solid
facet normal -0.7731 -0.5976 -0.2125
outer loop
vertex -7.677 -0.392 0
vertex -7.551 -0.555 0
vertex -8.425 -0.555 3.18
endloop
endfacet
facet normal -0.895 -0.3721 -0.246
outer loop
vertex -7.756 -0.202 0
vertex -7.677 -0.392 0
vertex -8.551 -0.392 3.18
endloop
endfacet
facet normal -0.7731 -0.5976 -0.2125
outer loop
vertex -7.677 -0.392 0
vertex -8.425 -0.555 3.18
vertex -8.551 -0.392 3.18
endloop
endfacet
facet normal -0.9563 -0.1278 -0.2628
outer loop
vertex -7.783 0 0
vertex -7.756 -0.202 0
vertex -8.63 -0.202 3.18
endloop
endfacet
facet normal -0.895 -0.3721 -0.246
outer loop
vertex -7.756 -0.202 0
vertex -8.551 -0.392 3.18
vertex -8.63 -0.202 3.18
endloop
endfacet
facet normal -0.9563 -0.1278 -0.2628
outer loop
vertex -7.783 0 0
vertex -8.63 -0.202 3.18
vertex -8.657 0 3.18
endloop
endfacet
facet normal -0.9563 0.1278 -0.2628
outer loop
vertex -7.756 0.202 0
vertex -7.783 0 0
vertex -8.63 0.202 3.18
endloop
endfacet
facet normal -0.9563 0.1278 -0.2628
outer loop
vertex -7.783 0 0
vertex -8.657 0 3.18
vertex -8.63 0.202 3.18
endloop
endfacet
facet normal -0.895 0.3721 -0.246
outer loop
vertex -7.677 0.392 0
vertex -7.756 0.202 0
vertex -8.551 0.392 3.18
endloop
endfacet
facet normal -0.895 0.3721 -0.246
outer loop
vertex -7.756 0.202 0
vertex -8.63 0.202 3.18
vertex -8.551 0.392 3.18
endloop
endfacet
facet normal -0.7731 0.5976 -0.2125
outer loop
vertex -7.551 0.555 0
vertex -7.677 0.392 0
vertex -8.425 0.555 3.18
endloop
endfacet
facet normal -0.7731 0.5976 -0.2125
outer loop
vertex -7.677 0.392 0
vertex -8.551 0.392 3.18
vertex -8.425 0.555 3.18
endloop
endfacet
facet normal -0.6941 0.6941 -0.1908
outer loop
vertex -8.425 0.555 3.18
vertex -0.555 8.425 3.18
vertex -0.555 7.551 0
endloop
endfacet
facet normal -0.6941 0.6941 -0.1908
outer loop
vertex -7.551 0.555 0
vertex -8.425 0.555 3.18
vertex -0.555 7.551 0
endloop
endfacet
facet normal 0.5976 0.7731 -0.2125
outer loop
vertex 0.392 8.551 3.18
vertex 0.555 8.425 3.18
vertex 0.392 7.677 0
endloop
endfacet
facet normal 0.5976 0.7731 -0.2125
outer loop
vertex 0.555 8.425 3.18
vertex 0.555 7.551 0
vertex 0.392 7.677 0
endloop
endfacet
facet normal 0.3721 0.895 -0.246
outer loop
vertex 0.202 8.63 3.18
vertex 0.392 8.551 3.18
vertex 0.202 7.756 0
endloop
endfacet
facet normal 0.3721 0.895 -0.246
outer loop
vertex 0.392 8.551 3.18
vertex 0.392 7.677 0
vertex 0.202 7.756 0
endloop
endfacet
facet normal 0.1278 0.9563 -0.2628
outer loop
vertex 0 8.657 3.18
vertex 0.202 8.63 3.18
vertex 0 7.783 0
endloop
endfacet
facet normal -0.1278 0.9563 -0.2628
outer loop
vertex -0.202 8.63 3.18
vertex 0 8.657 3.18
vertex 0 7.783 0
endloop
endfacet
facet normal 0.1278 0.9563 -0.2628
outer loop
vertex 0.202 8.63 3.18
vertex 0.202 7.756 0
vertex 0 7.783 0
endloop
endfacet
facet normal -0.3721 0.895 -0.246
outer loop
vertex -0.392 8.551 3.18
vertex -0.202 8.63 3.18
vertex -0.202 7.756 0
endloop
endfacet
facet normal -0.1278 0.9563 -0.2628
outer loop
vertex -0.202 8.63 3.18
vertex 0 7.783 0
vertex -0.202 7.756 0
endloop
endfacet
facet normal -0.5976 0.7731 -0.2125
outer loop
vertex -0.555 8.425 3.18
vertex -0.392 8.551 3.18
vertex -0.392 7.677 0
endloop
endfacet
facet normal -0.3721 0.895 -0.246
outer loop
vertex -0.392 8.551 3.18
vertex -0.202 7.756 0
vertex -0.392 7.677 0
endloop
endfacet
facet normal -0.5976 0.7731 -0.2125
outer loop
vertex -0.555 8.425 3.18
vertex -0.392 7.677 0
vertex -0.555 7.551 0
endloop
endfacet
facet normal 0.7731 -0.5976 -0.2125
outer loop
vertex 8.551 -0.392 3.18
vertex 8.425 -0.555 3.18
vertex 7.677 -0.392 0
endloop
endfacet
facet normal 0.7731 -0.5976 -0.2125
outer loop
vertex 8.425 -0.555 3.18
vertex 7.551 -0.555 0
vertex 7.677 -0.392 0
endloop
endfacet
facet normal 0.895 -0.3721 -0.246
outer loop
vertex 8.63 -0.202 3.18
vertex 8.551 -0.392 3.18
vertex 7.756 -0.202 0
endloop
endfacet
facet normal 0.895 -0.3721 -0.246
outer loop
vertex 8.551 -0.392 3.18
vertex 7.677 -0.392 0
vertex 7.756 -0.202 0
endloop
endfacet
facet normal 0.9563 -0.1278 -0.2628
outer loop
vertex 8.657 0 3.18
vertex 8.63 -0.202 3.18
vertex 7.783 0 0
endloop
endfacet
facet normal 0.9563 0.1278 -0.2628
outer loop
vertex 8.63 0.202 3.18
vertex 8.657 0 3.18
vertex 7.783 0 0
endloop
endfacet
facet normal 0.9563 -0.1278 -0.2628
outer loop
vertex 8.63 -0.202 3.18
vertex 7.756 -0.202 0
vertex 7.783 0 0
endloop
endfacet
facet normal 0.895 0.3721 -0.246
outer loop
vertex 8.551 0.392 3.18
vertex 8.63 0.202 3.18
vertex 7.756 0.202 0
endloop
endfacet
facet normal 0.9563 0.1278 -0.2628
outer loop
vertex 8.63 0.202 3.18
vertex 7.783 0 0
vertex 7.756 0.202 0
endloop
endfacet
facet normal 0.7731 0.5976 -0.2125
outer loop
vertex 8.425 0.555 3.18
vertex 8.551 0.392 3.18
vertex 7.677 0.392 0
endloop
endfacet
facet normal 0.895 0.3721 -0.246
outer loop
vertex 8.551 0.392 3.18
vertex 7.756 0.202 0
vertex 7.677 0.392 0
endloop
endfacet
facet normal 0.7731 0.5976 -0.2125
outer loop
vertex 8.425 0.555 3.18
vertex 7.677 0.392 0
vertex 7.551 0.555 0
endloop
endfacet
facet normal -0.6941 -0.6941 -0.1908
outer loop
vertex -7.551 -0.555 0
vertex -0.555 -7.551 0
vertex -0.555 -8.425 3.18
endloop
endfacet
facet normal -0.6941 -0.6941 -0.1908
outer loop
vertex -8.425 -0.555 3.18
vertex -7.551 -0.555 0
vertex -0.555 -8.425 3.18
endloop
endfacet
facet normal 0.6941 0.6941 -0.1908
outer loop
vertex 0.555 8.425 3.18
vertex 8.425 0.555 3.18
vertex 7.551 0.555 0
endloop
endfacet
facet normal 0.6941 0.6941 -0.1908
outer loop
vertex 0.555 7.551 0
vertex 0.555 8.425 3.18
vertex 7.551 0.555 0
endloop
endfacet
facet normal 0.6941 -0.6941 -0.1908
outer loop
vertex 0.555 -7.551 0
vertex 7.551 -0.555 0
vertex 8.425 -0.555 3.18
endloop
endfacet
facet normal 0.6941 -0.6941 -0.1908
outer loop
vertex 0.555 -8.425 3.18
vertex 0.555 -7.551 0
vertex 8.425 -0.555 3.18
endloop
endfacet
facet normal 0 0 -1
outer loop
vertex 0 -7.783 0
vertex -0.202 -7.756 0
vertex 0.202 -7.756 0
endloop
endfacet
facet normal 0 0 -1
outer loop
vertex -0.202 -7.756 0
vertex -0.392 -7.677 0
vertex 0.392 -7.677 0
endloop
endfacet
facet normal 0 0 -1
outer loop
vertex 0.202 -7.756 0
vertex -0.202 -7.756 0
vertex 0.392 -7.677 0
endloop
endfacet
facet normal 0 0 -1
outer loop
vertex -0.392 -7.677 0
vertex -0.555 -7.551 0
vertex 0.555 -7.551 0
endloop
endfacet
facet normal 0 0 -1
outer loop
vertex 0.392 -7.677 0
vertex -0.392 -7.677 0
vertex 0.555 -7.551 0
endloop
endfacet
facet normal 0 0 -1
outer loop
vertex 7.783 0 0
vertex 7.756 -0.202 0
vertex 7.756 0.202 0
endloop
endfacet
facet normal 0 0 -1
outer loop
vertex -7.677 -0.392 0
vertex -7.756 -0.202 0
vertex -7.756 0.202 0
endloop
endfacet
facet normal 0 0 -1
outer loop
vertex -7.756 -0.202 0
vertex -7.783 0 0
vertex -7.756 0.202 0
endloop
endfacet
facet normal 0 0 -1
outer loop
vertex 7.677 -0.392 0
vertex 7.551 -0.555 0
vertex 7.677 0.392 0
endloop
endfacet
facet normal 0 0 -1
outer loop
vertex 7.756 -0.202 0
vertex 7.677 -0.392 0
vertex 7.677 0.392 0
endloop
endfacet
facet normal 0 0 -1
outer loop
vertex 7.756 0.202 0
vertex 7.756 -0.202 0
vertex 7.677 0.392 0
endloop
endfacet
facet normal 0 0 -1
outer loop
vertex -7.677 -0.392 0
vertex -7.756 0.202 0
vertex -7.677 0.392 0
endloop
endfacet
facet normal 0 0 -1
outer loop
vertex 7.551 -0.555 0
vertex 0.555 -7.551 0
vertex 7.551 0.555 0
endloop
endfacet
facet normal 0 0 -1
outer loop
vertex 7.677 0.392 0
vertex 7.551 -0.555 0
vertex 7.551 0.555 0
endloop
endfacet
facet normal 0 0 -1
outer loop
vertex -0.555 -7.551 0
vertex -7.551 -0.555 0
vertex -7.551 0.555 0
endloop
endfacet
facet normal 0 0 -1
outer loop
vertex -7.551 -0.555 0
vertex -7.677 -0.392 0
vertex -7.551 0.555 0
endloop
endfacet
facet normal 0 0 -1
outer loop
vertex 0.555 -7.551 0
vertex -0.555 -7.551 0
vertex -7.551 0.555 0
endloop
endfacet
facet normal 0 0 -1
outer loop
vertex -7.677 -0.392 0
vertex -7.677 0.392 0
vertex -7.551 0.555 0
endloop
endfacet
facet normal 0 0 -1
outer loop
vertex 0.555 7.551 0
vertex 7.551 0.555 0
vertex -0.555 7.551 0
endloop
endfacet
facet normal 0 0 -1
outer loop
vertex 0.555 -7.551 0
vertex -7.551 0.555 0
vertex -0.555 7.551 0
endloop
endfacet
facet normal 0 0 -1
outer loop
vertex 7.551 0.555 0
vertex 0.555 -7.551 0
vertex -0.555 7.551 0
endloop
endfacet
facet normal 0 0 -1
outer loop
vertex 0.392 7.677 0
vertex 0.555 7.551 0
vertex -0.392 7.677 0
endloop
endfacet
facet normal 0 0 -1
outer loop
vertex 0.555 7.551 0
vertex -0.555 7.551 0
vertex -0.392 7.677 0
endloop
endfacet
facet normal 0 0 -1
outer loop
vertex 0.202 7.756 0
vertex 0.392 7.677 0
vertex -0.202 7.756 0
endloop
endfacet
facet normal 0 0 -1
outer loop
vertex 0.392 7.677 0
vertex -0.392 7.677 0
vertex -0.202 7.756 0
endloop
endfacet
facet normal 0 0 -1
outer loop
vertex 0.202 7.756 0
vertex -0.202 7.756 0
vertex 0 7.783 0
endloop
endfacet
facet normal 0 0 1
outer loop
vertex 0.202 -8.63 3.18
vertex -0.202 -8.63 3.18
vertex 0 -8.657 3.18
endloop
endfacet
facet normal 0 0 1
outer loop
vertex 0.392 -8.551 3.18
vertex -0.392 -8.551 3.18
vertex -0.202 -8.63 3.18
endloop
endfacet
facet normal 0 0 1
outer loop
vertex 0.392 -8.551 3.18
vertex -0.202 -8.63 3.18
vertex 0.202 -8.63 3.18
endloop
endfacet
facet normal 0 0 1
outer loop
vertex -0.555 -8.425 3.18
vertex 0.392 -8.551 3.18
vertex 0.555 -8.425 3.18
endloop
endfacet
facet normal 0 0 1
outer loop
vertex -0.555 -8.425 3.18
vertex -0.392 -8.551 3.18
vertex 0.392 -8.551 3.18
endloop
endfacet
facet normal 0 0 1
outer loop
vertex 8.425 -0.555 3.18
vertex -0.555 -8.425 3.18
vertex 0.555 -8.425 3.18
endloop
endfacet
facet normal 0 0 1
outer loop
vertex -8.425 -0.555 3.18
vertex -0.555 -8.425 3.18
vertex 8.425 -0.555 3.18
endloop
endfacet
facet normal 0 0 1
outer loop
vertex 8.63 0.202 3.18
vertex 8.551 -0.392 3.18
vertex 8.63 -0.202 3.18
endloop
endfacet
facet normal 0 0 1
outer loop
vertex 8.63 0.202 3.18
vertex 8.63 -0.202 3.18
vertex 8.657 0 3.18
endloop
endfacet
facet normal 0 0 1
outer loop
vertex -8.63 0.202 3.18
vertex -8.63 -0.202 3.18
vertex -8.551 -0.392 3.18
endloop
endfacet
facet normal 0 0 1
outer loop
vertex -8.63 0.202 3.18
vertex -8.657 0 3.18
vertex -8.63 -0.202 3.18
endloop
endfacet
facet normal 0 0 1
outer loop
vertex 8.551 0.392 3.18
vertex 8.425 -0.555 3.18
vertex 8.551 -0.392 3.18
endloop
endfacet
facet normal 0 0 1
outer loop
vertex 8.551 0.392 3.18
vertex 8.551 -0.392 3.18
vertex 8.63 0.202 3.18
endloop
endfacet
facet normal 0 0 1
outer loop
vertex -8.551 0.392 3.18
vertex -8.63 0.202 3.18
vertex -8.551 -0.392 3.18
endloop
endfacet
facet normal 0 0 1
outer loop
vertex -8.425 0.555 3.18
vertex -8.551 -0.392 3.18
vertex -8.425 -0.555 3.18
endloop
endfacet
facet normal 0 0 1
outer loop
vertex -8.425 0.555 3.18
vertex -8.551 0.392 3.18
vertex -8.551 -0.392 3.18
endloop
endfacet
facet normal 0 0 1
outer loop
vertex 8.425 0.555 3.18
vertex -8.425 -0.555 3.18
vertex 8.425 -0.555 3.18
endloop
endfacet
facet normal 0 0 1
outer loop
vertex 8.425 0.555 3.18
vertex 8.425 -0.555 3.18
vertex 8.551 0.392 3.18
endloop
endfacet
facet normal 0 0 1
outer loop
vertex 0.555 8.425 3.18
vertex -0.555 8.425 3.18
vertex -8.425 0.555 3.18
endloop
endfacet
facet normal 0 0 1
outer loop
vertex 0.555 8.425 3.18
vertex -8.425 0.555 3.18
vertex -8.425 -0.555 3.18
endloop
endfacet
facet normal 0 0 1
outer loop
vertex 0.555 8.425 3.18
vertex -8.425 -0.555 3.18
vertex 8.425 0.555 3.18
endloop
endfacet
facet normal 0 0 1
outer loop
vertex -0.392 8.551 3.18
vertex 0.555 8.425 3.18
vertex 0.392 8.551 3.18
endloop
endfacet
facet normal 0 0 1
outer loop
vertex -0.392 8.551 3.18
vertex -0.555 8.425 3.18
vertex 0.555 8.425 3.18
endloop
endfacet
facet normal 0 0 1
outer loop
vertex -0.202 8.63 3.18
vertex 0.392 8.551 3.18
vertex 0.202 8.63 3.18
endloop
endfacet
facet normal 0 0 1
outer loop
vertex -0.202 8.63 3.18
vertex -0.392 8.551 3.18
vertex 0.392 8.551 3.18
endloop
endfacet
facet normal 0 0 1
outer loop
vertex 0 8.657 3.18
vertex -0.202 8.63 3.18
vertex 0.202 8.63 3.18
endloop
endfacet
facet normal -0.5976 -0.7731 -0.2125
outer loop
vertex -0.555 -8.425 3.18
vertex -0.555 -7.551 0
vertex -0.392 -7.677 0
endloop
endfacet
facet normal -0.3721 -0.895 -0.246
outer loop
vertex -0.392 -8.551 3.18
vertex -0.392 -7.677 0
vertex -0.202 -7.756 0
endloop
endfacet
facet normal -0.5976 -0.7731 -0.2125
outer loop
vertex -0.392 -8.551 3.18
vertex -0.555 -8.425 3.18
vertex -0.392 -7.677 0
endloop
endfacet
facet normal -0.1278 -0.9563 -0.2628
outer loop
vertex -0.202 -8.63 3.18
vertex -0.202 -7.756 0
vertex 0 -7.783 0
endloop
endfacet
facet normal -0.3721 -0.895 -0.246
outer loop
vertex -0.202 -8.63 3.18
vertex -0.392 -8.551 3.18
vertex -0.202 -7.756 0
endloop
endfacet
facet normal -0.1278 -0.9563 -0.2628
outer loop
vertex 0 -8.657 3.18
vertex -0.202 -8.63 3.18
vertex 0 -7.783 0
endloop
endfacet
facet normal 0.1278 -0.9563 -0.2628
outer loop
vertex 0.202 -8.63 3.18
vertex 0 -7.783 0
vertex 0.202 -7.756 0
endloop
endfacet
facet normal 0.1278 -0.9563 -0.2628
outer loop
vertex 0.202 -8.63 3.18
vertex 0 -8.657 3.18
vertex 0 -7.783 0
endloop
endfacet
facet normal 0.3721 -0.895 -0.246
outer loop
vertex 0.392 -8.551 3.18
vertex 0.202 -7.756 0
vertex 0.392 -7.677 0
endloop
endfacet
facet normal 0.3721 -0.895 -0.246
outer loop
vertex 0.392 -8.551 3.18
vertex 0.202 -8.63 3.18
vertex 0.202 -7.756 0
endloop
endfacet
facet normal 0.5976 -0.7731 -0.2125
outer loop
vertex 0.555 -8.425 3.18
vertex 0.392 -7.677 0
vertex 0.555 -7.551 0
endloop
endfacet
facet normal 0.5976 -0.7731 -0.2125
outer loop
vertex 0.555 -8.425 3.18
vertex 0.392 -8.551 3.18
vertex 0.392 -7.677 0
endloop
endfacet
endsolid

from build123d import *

# Parameters (mm, degrees)
F0_W     = 12.7
F0_H     = 12.7
F1_DEPTH = 3.18
F3_DEPTH = 12.701
F5_DEPTH = 6.5
F6_R     = 0.8
F7_ANGLE = 45


with BuildPart() as f1:
    # F0 (on Top) → F1 (new body)
    with BuildSketch(Plane.XY):
        Rectangle(F0_W, F0_H)
    extrude(amount=F1_DEPTH)

    # F2 (on face) → F3 (cut, through all)
    with BuildSketch(Plane.XZ.offset(6.35)):
        Polygon((6.35, 0), (6.35, 3.18), (5.7318706169, 0), align=None)
        Polygon((-5.7318706169, 0), (-6.35, 3.18), (-6.35, 0), align=None)
    extrude(amount=-F3_DEPTH, mode=Mode.SUBTRACT)

    # F4 (on Right) → F5 (cut, symmetric)
    with BuildSketch(Plane.YZ):
        Polygon((6.35, 0), (6.35, 3.18), (5.7318706169, 0), align=None)
        Polygon((-5.7318706169, 0), (-6.35, 3.18), (-6.35, 0), align=None)
    extrude(amount=F5_DEPTH, both=True, mode=Mode.SUBTRACT)

    # F6
    f6_edges = [f1.edges().sort_by_distance(p)[0] for p in [
        (6.040935, -6.040935, 1.59),
        (-6.040935, -6.040935, 1.59),
        (6.040935, 6.040935, 1.59),
        (-6.040935, 6.040935, 1.59),
    ]]
    fillet(f6_edges, radius=F6_R)


with BuildPart() as f1_1:
    # F7: moved
    add(f1.part.rotate(Axis((0, 0, 0.6975659635), (0, 0, 1)), F7_ANGLE))


solid = f1_1.part
